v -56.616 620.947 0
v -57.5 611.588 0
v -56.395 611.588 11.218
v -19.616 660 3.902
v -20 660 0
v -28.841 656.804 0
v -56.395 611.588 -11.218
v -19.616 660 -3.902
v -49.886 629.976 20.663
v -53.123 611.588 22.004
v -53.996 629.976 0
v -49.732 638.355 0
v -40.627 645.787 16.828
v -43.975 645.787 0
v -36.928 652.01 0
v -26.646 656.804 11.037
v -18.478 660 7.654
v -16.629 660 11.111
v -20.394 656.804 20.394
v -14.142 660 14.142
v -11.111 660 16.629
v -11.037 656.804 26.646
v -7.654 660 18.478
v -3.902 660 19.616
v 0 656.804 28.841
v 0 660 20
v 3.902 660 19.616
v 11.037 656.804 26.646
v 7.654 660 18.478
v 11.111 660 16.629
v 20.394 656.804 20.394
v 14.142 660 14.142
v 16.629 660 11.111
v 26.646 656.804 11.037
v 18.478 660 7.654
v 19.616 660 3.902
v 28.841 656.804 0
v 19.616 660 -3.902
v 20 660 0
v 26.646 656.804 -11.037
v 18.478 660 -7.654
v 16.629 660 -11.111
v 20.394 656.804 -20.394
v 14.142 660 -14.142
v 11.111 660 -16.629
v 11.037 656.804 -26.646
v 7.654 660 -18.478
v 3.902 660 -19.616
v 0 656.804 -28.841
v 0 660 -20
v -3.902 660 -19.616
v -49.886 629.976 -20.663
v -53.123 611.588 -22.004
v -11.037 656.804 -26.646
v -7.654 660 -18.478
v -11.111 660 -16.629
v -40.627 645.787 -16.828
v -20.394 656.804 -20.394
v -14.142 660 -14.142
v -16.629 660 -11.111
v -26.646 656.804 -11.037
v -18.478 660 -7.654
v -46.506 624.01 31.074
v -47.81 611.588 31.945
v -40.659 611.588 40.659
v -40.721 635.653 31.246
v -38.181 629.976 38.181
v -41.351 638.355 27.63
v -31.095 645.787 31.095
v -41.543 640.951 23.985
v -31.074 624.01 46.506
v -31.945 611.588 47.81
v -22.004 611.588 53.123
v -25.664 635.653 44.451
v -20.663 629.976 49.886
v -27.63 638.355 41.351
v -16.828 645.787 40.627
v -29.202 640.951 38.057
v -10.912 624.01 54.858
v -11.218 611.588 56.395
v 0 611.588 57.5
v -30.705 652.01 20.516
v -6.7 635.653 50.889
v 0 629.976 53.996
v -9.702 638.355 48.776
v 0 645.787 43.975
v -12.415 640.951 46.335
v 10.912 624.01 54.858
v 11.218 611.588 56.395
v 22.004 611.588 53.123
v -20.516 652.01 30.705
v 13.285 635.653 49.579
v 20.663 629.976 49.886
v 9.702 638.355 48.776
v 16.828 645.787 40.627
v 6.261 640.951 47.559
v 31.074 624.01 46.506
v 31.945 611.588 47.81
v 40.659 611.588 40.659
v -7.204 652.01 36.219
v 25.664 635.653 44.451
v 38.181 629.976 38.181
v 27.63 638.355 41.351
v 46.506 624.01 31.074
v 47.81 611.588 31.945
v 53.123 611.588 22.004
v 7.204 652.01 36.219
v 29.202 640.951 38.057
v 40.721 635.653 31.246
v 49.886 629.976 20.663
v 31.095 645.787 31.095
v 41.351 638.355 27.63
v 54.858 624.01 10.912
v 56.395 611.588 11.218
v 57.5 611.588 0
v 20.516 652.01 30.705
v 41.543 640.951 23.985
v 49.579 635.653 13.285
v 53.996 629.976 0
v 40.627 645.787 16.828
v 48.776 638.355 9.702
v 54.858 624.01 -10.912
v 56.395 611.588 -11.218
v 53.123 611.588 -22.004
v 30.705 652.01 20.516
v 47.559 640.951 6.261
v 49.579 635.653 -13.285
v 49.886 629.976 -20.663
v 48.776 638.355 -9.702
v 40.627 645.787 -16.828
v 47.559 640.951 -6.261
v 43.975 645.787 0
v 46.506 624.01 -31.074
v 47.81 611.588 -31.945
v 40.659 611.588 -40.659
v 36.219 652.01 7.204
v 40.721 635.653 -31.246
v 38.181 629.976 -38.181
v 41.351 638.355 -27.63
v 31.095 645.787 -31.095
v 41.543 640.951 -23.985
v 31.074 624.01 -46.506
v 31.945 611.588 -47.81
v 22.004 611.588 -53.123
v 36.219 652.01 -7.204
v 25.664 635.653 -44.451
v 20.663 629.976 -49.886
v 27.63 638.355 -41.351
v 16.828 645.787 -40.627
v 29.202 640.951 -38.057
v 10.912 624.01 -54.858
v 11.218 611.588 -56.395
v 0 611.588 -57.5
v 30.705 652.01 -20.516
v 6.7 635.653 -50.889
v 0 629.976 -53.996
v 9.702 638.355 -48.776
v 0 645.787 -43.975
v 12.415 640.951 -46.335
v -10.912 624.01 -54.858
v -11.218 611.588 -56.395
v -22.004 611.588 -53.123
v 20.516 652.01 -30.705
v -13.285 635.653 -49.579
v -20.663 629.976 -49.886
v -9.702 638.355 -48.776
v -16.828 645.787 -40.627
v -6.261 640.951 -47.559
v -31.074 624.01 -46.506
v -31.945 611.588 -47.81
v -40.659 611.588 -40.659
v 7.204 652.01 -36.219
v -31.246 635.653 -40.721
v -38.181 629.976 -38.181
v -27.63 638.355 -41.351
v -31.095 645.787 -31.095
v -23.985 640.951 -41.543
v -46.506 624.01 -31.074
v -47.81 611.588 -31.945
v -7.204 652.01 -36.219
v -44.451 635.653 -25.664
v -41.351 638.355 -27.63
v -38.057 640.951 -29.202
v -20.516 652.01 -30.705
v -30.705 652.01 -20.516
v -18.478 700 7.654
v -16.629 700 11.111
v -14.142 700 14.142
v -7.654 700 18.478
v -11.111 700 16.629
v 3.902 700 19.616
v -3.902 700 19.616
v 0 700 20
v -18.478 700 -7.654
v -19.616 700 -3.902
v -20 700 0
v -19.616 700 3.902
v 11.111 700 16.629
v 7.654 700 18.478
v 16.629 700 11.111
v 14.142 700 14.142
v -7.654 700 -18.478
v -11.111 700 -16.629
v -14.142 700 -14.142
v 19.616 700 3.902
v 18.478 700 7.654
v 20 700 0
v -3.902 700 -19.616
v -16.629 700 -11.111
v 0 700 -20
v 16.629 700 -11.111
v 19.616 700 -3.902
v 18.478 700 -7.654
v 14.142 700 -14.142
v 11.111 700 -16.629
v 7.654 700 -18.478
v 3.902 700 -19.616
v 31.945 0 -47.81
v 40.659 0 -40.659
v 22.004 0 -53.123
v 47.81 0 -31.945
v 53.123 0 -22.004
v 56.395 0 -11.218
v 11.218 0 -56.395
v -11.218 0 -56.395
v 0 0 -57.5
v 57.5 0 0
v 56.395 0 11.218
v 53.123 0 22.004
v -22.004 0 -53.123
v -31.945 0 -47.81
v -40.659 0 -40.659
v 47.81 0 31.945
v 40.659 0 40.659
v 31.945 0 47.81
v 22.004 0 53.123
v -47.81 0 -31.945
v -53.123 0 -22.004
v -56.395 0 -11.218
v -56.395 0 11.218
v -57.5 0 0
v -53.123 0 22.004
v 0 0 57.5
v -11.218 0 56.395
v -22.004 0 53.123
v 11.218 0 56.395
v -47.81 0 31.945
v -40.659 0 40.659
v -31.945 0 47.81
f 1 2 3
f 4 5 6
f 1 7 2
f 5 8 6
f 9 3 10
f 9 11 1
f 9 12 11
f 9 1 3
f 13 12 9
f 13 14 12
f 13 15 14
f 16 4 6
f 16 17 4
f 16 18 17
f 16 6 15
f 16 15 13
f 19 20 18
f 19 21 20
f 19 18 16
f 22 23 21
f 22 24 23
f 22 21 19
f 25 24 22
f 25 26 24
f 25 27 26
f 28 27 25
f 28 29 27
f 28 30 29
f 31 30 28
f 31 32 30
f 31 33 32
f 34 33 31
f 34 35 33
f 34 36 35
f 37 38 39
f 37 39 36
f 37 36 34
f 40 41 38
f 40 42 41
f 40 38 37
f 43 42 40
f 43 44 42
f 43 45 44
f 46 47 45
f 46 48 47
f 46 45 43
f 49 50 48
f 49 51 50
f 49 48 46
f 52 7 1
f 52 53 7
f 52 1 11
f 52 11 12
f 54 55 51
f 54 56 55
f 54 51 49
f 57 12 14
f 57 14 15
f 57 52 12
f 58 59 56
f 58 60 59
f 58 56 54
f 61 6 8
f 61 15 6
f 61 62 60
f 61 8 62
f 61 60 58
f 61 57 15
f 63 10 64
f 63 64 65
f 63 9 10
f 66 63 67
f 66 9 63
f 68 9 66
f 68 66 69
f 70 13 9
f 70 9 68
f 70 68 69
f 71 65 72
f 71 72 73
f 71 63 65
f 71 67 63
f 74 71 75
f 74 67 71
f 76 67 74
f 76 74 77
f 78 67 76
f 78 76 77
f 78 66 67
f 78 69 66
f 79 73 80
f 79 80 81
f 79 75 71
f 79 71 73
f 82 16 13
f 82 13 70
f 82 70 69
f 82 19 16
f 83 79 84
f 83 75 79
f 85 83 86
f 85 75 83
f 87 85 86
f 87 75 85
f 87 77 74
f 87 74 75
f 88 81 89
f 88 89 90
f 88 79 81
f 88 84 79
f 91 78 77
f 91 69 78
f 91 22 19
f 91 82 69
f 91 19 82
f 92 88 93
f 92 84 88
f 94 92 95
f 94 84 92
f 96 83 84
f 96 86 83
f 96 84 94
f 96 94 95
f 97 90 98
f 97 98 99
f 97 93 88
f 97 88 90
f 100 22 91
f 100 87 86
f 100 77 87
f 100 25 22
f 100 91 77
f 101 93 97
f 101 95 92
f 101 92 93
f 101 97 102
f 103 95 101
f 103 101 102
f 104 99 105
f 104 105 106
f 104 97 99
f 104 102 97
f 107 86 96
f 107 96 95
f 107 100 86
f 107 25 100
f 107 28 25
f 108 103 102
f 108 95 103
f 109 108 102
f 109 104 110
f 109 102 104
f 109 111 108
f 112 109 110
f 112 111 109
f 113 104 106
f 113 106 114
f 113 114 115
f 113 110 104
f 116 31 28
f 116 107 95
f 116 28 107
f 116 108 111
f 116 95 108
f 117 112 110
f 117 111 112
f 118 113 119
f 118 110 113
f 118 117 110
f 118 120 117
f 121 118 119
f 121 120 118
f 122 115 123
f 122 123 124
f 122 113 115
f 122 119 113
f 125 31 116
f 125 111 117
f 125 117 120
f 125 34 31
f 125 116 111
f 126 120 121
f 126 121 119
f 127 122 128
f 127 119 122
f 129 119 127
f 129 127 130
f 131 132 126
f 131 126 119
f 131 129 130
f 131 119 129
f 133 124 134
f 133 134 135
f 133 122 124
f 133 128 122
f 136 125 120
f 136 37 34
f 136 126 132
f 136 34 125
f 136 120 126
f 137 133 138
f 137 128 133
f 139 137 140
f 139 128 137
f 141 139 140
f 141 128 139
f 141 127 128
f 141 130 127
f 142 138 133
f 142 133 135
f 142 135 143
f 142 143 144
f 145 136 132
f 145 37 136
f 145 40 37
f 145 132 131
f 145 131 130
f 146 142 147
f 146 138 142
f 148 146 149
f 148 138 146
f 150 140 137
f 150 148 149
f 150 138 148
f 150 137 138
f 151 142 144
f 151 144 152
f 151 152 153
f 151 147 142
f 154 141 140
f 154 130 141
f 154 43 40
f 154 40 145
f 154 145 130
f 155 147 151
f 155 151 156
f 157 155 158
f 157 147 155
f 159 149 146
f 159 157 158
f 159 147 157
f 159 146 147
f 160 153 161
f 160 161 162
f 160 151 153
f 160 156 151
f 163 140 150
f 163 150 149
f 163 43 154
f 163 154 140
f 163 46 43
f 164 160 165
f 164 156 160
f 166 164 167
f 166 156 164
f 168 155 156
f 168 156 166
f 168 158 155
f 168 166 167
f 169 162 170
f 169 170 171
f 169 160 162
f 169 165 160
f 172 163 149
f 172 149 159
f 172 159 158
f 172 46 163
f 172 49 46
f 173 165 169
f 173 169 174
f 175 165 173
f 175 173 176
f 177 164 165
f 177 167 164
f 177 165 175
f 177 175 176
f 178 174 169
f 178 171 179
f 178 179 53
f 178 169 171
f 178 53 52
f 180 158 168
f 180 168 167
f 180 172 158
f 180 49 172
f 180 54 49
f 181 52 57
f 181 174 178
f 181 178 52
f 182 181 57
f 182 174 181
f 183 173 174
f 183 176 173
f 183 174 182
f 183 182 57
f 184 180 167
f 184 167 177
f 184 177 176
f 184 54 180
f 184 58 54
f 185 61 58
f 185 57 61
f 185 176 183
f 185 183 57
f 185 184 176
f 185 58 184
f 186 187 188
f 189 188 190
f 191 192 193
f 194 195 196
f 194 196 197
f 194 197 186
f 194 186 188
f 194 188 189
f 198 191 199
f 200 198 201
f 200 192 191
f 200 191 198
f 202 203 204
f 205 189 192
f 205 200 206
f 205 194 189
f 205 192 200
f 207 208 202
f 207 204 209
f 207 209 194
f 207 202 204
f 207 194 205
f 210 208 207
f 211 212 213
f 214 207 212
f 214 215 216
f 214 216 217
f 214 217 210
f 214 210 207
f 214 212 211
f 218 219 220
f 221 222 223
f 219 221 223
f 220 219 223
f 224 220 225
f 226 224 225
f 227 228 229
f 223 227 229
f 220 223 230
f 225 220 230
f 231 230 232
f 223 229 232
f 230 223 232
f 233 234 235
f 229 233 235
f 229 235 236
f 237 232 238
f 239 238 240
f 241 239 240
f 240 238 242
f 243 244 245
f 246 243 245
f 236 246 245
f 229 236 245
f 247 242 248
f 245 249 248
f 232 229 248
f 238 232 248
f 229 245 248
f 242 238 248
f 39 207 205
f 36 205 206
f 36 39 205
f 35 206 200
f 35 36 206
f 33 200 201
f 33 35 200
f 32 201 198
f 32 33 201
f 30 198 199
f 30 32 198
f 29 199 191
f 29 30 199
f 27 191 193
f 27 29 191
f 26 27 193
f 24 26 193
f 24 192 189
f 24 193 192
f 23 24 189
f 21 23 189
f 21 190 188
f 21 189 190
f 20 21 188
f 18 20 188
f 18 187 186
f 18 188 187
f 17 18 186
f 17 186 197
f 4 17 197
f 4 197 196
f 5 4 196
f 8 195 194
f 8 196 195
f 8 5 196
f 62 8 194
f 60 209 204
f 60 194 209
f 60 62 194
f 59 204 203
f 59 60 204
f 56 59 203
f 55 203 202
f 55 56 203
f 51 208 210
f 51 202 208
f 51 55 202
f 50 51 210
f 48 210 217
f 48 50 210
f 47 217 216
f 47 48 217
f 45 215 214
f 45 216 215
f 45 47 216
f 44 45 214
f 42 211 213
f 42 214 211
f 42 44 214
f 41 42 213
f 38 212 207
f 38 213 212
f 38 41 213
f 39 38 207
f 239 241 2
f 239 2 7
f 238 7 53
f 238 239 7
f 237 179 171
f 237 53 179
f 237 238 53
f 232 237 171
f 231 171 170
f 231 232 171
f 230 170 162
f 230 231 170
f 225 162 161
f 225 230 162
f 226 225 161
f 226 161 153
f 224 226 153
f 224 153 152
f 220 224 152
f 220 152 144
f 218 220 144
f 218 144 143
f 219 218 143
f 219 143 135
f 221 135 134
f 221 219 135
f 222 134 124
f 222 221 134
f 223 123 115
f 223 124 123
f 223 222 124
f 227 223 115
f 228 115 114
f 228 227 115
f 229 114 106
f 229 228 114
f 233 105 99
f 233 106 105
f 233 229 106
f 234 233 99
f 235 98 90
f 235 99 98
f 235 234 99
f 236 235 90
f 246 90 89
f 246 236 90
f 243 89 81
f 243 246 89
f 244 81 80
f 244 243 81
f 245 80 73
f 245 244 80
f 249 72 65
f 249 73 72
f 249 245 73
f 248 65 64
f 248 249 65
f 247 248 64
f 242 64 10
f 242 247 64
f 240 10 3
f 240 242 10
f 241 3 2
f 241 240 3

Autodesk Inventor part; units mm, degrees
ref_plane "YZ Plane" through (0, 0, 0) normal (1, 0, 0) x (0, 1, 0)
ref_plane "XZ Plane" through (0, 0, 0) normal (0, 1, 0) x (-1, 0, 0)
ref_plane "XY Plane" through (0, 0, 0) normal (0, 0, 1) x (1, 0, 0)
sketch "Sketch1" plane through (0, 0, 0) normal (0, 1, 0) x (-1, 0, 0)
  circle A0 centre (0, 0) radius 57.5
  dimension "d0" = 115
extrude "Extrusion1" add sketch "Sketch1" along normal blind 660
sketch "Sketch2" plane through (0, 660, 0) normal (0, 1, 0) x (1, 0, 0)
  circle A0 centre (0, 0) radius 20
  dimension "d3" = 40
extrude "Extrusion2" add sketch "Sketch2" along normal blind 40
fillet "Fillet1" radius 50 1 edges at (57.5, 660, 0)
properties part number "Cylinder"
